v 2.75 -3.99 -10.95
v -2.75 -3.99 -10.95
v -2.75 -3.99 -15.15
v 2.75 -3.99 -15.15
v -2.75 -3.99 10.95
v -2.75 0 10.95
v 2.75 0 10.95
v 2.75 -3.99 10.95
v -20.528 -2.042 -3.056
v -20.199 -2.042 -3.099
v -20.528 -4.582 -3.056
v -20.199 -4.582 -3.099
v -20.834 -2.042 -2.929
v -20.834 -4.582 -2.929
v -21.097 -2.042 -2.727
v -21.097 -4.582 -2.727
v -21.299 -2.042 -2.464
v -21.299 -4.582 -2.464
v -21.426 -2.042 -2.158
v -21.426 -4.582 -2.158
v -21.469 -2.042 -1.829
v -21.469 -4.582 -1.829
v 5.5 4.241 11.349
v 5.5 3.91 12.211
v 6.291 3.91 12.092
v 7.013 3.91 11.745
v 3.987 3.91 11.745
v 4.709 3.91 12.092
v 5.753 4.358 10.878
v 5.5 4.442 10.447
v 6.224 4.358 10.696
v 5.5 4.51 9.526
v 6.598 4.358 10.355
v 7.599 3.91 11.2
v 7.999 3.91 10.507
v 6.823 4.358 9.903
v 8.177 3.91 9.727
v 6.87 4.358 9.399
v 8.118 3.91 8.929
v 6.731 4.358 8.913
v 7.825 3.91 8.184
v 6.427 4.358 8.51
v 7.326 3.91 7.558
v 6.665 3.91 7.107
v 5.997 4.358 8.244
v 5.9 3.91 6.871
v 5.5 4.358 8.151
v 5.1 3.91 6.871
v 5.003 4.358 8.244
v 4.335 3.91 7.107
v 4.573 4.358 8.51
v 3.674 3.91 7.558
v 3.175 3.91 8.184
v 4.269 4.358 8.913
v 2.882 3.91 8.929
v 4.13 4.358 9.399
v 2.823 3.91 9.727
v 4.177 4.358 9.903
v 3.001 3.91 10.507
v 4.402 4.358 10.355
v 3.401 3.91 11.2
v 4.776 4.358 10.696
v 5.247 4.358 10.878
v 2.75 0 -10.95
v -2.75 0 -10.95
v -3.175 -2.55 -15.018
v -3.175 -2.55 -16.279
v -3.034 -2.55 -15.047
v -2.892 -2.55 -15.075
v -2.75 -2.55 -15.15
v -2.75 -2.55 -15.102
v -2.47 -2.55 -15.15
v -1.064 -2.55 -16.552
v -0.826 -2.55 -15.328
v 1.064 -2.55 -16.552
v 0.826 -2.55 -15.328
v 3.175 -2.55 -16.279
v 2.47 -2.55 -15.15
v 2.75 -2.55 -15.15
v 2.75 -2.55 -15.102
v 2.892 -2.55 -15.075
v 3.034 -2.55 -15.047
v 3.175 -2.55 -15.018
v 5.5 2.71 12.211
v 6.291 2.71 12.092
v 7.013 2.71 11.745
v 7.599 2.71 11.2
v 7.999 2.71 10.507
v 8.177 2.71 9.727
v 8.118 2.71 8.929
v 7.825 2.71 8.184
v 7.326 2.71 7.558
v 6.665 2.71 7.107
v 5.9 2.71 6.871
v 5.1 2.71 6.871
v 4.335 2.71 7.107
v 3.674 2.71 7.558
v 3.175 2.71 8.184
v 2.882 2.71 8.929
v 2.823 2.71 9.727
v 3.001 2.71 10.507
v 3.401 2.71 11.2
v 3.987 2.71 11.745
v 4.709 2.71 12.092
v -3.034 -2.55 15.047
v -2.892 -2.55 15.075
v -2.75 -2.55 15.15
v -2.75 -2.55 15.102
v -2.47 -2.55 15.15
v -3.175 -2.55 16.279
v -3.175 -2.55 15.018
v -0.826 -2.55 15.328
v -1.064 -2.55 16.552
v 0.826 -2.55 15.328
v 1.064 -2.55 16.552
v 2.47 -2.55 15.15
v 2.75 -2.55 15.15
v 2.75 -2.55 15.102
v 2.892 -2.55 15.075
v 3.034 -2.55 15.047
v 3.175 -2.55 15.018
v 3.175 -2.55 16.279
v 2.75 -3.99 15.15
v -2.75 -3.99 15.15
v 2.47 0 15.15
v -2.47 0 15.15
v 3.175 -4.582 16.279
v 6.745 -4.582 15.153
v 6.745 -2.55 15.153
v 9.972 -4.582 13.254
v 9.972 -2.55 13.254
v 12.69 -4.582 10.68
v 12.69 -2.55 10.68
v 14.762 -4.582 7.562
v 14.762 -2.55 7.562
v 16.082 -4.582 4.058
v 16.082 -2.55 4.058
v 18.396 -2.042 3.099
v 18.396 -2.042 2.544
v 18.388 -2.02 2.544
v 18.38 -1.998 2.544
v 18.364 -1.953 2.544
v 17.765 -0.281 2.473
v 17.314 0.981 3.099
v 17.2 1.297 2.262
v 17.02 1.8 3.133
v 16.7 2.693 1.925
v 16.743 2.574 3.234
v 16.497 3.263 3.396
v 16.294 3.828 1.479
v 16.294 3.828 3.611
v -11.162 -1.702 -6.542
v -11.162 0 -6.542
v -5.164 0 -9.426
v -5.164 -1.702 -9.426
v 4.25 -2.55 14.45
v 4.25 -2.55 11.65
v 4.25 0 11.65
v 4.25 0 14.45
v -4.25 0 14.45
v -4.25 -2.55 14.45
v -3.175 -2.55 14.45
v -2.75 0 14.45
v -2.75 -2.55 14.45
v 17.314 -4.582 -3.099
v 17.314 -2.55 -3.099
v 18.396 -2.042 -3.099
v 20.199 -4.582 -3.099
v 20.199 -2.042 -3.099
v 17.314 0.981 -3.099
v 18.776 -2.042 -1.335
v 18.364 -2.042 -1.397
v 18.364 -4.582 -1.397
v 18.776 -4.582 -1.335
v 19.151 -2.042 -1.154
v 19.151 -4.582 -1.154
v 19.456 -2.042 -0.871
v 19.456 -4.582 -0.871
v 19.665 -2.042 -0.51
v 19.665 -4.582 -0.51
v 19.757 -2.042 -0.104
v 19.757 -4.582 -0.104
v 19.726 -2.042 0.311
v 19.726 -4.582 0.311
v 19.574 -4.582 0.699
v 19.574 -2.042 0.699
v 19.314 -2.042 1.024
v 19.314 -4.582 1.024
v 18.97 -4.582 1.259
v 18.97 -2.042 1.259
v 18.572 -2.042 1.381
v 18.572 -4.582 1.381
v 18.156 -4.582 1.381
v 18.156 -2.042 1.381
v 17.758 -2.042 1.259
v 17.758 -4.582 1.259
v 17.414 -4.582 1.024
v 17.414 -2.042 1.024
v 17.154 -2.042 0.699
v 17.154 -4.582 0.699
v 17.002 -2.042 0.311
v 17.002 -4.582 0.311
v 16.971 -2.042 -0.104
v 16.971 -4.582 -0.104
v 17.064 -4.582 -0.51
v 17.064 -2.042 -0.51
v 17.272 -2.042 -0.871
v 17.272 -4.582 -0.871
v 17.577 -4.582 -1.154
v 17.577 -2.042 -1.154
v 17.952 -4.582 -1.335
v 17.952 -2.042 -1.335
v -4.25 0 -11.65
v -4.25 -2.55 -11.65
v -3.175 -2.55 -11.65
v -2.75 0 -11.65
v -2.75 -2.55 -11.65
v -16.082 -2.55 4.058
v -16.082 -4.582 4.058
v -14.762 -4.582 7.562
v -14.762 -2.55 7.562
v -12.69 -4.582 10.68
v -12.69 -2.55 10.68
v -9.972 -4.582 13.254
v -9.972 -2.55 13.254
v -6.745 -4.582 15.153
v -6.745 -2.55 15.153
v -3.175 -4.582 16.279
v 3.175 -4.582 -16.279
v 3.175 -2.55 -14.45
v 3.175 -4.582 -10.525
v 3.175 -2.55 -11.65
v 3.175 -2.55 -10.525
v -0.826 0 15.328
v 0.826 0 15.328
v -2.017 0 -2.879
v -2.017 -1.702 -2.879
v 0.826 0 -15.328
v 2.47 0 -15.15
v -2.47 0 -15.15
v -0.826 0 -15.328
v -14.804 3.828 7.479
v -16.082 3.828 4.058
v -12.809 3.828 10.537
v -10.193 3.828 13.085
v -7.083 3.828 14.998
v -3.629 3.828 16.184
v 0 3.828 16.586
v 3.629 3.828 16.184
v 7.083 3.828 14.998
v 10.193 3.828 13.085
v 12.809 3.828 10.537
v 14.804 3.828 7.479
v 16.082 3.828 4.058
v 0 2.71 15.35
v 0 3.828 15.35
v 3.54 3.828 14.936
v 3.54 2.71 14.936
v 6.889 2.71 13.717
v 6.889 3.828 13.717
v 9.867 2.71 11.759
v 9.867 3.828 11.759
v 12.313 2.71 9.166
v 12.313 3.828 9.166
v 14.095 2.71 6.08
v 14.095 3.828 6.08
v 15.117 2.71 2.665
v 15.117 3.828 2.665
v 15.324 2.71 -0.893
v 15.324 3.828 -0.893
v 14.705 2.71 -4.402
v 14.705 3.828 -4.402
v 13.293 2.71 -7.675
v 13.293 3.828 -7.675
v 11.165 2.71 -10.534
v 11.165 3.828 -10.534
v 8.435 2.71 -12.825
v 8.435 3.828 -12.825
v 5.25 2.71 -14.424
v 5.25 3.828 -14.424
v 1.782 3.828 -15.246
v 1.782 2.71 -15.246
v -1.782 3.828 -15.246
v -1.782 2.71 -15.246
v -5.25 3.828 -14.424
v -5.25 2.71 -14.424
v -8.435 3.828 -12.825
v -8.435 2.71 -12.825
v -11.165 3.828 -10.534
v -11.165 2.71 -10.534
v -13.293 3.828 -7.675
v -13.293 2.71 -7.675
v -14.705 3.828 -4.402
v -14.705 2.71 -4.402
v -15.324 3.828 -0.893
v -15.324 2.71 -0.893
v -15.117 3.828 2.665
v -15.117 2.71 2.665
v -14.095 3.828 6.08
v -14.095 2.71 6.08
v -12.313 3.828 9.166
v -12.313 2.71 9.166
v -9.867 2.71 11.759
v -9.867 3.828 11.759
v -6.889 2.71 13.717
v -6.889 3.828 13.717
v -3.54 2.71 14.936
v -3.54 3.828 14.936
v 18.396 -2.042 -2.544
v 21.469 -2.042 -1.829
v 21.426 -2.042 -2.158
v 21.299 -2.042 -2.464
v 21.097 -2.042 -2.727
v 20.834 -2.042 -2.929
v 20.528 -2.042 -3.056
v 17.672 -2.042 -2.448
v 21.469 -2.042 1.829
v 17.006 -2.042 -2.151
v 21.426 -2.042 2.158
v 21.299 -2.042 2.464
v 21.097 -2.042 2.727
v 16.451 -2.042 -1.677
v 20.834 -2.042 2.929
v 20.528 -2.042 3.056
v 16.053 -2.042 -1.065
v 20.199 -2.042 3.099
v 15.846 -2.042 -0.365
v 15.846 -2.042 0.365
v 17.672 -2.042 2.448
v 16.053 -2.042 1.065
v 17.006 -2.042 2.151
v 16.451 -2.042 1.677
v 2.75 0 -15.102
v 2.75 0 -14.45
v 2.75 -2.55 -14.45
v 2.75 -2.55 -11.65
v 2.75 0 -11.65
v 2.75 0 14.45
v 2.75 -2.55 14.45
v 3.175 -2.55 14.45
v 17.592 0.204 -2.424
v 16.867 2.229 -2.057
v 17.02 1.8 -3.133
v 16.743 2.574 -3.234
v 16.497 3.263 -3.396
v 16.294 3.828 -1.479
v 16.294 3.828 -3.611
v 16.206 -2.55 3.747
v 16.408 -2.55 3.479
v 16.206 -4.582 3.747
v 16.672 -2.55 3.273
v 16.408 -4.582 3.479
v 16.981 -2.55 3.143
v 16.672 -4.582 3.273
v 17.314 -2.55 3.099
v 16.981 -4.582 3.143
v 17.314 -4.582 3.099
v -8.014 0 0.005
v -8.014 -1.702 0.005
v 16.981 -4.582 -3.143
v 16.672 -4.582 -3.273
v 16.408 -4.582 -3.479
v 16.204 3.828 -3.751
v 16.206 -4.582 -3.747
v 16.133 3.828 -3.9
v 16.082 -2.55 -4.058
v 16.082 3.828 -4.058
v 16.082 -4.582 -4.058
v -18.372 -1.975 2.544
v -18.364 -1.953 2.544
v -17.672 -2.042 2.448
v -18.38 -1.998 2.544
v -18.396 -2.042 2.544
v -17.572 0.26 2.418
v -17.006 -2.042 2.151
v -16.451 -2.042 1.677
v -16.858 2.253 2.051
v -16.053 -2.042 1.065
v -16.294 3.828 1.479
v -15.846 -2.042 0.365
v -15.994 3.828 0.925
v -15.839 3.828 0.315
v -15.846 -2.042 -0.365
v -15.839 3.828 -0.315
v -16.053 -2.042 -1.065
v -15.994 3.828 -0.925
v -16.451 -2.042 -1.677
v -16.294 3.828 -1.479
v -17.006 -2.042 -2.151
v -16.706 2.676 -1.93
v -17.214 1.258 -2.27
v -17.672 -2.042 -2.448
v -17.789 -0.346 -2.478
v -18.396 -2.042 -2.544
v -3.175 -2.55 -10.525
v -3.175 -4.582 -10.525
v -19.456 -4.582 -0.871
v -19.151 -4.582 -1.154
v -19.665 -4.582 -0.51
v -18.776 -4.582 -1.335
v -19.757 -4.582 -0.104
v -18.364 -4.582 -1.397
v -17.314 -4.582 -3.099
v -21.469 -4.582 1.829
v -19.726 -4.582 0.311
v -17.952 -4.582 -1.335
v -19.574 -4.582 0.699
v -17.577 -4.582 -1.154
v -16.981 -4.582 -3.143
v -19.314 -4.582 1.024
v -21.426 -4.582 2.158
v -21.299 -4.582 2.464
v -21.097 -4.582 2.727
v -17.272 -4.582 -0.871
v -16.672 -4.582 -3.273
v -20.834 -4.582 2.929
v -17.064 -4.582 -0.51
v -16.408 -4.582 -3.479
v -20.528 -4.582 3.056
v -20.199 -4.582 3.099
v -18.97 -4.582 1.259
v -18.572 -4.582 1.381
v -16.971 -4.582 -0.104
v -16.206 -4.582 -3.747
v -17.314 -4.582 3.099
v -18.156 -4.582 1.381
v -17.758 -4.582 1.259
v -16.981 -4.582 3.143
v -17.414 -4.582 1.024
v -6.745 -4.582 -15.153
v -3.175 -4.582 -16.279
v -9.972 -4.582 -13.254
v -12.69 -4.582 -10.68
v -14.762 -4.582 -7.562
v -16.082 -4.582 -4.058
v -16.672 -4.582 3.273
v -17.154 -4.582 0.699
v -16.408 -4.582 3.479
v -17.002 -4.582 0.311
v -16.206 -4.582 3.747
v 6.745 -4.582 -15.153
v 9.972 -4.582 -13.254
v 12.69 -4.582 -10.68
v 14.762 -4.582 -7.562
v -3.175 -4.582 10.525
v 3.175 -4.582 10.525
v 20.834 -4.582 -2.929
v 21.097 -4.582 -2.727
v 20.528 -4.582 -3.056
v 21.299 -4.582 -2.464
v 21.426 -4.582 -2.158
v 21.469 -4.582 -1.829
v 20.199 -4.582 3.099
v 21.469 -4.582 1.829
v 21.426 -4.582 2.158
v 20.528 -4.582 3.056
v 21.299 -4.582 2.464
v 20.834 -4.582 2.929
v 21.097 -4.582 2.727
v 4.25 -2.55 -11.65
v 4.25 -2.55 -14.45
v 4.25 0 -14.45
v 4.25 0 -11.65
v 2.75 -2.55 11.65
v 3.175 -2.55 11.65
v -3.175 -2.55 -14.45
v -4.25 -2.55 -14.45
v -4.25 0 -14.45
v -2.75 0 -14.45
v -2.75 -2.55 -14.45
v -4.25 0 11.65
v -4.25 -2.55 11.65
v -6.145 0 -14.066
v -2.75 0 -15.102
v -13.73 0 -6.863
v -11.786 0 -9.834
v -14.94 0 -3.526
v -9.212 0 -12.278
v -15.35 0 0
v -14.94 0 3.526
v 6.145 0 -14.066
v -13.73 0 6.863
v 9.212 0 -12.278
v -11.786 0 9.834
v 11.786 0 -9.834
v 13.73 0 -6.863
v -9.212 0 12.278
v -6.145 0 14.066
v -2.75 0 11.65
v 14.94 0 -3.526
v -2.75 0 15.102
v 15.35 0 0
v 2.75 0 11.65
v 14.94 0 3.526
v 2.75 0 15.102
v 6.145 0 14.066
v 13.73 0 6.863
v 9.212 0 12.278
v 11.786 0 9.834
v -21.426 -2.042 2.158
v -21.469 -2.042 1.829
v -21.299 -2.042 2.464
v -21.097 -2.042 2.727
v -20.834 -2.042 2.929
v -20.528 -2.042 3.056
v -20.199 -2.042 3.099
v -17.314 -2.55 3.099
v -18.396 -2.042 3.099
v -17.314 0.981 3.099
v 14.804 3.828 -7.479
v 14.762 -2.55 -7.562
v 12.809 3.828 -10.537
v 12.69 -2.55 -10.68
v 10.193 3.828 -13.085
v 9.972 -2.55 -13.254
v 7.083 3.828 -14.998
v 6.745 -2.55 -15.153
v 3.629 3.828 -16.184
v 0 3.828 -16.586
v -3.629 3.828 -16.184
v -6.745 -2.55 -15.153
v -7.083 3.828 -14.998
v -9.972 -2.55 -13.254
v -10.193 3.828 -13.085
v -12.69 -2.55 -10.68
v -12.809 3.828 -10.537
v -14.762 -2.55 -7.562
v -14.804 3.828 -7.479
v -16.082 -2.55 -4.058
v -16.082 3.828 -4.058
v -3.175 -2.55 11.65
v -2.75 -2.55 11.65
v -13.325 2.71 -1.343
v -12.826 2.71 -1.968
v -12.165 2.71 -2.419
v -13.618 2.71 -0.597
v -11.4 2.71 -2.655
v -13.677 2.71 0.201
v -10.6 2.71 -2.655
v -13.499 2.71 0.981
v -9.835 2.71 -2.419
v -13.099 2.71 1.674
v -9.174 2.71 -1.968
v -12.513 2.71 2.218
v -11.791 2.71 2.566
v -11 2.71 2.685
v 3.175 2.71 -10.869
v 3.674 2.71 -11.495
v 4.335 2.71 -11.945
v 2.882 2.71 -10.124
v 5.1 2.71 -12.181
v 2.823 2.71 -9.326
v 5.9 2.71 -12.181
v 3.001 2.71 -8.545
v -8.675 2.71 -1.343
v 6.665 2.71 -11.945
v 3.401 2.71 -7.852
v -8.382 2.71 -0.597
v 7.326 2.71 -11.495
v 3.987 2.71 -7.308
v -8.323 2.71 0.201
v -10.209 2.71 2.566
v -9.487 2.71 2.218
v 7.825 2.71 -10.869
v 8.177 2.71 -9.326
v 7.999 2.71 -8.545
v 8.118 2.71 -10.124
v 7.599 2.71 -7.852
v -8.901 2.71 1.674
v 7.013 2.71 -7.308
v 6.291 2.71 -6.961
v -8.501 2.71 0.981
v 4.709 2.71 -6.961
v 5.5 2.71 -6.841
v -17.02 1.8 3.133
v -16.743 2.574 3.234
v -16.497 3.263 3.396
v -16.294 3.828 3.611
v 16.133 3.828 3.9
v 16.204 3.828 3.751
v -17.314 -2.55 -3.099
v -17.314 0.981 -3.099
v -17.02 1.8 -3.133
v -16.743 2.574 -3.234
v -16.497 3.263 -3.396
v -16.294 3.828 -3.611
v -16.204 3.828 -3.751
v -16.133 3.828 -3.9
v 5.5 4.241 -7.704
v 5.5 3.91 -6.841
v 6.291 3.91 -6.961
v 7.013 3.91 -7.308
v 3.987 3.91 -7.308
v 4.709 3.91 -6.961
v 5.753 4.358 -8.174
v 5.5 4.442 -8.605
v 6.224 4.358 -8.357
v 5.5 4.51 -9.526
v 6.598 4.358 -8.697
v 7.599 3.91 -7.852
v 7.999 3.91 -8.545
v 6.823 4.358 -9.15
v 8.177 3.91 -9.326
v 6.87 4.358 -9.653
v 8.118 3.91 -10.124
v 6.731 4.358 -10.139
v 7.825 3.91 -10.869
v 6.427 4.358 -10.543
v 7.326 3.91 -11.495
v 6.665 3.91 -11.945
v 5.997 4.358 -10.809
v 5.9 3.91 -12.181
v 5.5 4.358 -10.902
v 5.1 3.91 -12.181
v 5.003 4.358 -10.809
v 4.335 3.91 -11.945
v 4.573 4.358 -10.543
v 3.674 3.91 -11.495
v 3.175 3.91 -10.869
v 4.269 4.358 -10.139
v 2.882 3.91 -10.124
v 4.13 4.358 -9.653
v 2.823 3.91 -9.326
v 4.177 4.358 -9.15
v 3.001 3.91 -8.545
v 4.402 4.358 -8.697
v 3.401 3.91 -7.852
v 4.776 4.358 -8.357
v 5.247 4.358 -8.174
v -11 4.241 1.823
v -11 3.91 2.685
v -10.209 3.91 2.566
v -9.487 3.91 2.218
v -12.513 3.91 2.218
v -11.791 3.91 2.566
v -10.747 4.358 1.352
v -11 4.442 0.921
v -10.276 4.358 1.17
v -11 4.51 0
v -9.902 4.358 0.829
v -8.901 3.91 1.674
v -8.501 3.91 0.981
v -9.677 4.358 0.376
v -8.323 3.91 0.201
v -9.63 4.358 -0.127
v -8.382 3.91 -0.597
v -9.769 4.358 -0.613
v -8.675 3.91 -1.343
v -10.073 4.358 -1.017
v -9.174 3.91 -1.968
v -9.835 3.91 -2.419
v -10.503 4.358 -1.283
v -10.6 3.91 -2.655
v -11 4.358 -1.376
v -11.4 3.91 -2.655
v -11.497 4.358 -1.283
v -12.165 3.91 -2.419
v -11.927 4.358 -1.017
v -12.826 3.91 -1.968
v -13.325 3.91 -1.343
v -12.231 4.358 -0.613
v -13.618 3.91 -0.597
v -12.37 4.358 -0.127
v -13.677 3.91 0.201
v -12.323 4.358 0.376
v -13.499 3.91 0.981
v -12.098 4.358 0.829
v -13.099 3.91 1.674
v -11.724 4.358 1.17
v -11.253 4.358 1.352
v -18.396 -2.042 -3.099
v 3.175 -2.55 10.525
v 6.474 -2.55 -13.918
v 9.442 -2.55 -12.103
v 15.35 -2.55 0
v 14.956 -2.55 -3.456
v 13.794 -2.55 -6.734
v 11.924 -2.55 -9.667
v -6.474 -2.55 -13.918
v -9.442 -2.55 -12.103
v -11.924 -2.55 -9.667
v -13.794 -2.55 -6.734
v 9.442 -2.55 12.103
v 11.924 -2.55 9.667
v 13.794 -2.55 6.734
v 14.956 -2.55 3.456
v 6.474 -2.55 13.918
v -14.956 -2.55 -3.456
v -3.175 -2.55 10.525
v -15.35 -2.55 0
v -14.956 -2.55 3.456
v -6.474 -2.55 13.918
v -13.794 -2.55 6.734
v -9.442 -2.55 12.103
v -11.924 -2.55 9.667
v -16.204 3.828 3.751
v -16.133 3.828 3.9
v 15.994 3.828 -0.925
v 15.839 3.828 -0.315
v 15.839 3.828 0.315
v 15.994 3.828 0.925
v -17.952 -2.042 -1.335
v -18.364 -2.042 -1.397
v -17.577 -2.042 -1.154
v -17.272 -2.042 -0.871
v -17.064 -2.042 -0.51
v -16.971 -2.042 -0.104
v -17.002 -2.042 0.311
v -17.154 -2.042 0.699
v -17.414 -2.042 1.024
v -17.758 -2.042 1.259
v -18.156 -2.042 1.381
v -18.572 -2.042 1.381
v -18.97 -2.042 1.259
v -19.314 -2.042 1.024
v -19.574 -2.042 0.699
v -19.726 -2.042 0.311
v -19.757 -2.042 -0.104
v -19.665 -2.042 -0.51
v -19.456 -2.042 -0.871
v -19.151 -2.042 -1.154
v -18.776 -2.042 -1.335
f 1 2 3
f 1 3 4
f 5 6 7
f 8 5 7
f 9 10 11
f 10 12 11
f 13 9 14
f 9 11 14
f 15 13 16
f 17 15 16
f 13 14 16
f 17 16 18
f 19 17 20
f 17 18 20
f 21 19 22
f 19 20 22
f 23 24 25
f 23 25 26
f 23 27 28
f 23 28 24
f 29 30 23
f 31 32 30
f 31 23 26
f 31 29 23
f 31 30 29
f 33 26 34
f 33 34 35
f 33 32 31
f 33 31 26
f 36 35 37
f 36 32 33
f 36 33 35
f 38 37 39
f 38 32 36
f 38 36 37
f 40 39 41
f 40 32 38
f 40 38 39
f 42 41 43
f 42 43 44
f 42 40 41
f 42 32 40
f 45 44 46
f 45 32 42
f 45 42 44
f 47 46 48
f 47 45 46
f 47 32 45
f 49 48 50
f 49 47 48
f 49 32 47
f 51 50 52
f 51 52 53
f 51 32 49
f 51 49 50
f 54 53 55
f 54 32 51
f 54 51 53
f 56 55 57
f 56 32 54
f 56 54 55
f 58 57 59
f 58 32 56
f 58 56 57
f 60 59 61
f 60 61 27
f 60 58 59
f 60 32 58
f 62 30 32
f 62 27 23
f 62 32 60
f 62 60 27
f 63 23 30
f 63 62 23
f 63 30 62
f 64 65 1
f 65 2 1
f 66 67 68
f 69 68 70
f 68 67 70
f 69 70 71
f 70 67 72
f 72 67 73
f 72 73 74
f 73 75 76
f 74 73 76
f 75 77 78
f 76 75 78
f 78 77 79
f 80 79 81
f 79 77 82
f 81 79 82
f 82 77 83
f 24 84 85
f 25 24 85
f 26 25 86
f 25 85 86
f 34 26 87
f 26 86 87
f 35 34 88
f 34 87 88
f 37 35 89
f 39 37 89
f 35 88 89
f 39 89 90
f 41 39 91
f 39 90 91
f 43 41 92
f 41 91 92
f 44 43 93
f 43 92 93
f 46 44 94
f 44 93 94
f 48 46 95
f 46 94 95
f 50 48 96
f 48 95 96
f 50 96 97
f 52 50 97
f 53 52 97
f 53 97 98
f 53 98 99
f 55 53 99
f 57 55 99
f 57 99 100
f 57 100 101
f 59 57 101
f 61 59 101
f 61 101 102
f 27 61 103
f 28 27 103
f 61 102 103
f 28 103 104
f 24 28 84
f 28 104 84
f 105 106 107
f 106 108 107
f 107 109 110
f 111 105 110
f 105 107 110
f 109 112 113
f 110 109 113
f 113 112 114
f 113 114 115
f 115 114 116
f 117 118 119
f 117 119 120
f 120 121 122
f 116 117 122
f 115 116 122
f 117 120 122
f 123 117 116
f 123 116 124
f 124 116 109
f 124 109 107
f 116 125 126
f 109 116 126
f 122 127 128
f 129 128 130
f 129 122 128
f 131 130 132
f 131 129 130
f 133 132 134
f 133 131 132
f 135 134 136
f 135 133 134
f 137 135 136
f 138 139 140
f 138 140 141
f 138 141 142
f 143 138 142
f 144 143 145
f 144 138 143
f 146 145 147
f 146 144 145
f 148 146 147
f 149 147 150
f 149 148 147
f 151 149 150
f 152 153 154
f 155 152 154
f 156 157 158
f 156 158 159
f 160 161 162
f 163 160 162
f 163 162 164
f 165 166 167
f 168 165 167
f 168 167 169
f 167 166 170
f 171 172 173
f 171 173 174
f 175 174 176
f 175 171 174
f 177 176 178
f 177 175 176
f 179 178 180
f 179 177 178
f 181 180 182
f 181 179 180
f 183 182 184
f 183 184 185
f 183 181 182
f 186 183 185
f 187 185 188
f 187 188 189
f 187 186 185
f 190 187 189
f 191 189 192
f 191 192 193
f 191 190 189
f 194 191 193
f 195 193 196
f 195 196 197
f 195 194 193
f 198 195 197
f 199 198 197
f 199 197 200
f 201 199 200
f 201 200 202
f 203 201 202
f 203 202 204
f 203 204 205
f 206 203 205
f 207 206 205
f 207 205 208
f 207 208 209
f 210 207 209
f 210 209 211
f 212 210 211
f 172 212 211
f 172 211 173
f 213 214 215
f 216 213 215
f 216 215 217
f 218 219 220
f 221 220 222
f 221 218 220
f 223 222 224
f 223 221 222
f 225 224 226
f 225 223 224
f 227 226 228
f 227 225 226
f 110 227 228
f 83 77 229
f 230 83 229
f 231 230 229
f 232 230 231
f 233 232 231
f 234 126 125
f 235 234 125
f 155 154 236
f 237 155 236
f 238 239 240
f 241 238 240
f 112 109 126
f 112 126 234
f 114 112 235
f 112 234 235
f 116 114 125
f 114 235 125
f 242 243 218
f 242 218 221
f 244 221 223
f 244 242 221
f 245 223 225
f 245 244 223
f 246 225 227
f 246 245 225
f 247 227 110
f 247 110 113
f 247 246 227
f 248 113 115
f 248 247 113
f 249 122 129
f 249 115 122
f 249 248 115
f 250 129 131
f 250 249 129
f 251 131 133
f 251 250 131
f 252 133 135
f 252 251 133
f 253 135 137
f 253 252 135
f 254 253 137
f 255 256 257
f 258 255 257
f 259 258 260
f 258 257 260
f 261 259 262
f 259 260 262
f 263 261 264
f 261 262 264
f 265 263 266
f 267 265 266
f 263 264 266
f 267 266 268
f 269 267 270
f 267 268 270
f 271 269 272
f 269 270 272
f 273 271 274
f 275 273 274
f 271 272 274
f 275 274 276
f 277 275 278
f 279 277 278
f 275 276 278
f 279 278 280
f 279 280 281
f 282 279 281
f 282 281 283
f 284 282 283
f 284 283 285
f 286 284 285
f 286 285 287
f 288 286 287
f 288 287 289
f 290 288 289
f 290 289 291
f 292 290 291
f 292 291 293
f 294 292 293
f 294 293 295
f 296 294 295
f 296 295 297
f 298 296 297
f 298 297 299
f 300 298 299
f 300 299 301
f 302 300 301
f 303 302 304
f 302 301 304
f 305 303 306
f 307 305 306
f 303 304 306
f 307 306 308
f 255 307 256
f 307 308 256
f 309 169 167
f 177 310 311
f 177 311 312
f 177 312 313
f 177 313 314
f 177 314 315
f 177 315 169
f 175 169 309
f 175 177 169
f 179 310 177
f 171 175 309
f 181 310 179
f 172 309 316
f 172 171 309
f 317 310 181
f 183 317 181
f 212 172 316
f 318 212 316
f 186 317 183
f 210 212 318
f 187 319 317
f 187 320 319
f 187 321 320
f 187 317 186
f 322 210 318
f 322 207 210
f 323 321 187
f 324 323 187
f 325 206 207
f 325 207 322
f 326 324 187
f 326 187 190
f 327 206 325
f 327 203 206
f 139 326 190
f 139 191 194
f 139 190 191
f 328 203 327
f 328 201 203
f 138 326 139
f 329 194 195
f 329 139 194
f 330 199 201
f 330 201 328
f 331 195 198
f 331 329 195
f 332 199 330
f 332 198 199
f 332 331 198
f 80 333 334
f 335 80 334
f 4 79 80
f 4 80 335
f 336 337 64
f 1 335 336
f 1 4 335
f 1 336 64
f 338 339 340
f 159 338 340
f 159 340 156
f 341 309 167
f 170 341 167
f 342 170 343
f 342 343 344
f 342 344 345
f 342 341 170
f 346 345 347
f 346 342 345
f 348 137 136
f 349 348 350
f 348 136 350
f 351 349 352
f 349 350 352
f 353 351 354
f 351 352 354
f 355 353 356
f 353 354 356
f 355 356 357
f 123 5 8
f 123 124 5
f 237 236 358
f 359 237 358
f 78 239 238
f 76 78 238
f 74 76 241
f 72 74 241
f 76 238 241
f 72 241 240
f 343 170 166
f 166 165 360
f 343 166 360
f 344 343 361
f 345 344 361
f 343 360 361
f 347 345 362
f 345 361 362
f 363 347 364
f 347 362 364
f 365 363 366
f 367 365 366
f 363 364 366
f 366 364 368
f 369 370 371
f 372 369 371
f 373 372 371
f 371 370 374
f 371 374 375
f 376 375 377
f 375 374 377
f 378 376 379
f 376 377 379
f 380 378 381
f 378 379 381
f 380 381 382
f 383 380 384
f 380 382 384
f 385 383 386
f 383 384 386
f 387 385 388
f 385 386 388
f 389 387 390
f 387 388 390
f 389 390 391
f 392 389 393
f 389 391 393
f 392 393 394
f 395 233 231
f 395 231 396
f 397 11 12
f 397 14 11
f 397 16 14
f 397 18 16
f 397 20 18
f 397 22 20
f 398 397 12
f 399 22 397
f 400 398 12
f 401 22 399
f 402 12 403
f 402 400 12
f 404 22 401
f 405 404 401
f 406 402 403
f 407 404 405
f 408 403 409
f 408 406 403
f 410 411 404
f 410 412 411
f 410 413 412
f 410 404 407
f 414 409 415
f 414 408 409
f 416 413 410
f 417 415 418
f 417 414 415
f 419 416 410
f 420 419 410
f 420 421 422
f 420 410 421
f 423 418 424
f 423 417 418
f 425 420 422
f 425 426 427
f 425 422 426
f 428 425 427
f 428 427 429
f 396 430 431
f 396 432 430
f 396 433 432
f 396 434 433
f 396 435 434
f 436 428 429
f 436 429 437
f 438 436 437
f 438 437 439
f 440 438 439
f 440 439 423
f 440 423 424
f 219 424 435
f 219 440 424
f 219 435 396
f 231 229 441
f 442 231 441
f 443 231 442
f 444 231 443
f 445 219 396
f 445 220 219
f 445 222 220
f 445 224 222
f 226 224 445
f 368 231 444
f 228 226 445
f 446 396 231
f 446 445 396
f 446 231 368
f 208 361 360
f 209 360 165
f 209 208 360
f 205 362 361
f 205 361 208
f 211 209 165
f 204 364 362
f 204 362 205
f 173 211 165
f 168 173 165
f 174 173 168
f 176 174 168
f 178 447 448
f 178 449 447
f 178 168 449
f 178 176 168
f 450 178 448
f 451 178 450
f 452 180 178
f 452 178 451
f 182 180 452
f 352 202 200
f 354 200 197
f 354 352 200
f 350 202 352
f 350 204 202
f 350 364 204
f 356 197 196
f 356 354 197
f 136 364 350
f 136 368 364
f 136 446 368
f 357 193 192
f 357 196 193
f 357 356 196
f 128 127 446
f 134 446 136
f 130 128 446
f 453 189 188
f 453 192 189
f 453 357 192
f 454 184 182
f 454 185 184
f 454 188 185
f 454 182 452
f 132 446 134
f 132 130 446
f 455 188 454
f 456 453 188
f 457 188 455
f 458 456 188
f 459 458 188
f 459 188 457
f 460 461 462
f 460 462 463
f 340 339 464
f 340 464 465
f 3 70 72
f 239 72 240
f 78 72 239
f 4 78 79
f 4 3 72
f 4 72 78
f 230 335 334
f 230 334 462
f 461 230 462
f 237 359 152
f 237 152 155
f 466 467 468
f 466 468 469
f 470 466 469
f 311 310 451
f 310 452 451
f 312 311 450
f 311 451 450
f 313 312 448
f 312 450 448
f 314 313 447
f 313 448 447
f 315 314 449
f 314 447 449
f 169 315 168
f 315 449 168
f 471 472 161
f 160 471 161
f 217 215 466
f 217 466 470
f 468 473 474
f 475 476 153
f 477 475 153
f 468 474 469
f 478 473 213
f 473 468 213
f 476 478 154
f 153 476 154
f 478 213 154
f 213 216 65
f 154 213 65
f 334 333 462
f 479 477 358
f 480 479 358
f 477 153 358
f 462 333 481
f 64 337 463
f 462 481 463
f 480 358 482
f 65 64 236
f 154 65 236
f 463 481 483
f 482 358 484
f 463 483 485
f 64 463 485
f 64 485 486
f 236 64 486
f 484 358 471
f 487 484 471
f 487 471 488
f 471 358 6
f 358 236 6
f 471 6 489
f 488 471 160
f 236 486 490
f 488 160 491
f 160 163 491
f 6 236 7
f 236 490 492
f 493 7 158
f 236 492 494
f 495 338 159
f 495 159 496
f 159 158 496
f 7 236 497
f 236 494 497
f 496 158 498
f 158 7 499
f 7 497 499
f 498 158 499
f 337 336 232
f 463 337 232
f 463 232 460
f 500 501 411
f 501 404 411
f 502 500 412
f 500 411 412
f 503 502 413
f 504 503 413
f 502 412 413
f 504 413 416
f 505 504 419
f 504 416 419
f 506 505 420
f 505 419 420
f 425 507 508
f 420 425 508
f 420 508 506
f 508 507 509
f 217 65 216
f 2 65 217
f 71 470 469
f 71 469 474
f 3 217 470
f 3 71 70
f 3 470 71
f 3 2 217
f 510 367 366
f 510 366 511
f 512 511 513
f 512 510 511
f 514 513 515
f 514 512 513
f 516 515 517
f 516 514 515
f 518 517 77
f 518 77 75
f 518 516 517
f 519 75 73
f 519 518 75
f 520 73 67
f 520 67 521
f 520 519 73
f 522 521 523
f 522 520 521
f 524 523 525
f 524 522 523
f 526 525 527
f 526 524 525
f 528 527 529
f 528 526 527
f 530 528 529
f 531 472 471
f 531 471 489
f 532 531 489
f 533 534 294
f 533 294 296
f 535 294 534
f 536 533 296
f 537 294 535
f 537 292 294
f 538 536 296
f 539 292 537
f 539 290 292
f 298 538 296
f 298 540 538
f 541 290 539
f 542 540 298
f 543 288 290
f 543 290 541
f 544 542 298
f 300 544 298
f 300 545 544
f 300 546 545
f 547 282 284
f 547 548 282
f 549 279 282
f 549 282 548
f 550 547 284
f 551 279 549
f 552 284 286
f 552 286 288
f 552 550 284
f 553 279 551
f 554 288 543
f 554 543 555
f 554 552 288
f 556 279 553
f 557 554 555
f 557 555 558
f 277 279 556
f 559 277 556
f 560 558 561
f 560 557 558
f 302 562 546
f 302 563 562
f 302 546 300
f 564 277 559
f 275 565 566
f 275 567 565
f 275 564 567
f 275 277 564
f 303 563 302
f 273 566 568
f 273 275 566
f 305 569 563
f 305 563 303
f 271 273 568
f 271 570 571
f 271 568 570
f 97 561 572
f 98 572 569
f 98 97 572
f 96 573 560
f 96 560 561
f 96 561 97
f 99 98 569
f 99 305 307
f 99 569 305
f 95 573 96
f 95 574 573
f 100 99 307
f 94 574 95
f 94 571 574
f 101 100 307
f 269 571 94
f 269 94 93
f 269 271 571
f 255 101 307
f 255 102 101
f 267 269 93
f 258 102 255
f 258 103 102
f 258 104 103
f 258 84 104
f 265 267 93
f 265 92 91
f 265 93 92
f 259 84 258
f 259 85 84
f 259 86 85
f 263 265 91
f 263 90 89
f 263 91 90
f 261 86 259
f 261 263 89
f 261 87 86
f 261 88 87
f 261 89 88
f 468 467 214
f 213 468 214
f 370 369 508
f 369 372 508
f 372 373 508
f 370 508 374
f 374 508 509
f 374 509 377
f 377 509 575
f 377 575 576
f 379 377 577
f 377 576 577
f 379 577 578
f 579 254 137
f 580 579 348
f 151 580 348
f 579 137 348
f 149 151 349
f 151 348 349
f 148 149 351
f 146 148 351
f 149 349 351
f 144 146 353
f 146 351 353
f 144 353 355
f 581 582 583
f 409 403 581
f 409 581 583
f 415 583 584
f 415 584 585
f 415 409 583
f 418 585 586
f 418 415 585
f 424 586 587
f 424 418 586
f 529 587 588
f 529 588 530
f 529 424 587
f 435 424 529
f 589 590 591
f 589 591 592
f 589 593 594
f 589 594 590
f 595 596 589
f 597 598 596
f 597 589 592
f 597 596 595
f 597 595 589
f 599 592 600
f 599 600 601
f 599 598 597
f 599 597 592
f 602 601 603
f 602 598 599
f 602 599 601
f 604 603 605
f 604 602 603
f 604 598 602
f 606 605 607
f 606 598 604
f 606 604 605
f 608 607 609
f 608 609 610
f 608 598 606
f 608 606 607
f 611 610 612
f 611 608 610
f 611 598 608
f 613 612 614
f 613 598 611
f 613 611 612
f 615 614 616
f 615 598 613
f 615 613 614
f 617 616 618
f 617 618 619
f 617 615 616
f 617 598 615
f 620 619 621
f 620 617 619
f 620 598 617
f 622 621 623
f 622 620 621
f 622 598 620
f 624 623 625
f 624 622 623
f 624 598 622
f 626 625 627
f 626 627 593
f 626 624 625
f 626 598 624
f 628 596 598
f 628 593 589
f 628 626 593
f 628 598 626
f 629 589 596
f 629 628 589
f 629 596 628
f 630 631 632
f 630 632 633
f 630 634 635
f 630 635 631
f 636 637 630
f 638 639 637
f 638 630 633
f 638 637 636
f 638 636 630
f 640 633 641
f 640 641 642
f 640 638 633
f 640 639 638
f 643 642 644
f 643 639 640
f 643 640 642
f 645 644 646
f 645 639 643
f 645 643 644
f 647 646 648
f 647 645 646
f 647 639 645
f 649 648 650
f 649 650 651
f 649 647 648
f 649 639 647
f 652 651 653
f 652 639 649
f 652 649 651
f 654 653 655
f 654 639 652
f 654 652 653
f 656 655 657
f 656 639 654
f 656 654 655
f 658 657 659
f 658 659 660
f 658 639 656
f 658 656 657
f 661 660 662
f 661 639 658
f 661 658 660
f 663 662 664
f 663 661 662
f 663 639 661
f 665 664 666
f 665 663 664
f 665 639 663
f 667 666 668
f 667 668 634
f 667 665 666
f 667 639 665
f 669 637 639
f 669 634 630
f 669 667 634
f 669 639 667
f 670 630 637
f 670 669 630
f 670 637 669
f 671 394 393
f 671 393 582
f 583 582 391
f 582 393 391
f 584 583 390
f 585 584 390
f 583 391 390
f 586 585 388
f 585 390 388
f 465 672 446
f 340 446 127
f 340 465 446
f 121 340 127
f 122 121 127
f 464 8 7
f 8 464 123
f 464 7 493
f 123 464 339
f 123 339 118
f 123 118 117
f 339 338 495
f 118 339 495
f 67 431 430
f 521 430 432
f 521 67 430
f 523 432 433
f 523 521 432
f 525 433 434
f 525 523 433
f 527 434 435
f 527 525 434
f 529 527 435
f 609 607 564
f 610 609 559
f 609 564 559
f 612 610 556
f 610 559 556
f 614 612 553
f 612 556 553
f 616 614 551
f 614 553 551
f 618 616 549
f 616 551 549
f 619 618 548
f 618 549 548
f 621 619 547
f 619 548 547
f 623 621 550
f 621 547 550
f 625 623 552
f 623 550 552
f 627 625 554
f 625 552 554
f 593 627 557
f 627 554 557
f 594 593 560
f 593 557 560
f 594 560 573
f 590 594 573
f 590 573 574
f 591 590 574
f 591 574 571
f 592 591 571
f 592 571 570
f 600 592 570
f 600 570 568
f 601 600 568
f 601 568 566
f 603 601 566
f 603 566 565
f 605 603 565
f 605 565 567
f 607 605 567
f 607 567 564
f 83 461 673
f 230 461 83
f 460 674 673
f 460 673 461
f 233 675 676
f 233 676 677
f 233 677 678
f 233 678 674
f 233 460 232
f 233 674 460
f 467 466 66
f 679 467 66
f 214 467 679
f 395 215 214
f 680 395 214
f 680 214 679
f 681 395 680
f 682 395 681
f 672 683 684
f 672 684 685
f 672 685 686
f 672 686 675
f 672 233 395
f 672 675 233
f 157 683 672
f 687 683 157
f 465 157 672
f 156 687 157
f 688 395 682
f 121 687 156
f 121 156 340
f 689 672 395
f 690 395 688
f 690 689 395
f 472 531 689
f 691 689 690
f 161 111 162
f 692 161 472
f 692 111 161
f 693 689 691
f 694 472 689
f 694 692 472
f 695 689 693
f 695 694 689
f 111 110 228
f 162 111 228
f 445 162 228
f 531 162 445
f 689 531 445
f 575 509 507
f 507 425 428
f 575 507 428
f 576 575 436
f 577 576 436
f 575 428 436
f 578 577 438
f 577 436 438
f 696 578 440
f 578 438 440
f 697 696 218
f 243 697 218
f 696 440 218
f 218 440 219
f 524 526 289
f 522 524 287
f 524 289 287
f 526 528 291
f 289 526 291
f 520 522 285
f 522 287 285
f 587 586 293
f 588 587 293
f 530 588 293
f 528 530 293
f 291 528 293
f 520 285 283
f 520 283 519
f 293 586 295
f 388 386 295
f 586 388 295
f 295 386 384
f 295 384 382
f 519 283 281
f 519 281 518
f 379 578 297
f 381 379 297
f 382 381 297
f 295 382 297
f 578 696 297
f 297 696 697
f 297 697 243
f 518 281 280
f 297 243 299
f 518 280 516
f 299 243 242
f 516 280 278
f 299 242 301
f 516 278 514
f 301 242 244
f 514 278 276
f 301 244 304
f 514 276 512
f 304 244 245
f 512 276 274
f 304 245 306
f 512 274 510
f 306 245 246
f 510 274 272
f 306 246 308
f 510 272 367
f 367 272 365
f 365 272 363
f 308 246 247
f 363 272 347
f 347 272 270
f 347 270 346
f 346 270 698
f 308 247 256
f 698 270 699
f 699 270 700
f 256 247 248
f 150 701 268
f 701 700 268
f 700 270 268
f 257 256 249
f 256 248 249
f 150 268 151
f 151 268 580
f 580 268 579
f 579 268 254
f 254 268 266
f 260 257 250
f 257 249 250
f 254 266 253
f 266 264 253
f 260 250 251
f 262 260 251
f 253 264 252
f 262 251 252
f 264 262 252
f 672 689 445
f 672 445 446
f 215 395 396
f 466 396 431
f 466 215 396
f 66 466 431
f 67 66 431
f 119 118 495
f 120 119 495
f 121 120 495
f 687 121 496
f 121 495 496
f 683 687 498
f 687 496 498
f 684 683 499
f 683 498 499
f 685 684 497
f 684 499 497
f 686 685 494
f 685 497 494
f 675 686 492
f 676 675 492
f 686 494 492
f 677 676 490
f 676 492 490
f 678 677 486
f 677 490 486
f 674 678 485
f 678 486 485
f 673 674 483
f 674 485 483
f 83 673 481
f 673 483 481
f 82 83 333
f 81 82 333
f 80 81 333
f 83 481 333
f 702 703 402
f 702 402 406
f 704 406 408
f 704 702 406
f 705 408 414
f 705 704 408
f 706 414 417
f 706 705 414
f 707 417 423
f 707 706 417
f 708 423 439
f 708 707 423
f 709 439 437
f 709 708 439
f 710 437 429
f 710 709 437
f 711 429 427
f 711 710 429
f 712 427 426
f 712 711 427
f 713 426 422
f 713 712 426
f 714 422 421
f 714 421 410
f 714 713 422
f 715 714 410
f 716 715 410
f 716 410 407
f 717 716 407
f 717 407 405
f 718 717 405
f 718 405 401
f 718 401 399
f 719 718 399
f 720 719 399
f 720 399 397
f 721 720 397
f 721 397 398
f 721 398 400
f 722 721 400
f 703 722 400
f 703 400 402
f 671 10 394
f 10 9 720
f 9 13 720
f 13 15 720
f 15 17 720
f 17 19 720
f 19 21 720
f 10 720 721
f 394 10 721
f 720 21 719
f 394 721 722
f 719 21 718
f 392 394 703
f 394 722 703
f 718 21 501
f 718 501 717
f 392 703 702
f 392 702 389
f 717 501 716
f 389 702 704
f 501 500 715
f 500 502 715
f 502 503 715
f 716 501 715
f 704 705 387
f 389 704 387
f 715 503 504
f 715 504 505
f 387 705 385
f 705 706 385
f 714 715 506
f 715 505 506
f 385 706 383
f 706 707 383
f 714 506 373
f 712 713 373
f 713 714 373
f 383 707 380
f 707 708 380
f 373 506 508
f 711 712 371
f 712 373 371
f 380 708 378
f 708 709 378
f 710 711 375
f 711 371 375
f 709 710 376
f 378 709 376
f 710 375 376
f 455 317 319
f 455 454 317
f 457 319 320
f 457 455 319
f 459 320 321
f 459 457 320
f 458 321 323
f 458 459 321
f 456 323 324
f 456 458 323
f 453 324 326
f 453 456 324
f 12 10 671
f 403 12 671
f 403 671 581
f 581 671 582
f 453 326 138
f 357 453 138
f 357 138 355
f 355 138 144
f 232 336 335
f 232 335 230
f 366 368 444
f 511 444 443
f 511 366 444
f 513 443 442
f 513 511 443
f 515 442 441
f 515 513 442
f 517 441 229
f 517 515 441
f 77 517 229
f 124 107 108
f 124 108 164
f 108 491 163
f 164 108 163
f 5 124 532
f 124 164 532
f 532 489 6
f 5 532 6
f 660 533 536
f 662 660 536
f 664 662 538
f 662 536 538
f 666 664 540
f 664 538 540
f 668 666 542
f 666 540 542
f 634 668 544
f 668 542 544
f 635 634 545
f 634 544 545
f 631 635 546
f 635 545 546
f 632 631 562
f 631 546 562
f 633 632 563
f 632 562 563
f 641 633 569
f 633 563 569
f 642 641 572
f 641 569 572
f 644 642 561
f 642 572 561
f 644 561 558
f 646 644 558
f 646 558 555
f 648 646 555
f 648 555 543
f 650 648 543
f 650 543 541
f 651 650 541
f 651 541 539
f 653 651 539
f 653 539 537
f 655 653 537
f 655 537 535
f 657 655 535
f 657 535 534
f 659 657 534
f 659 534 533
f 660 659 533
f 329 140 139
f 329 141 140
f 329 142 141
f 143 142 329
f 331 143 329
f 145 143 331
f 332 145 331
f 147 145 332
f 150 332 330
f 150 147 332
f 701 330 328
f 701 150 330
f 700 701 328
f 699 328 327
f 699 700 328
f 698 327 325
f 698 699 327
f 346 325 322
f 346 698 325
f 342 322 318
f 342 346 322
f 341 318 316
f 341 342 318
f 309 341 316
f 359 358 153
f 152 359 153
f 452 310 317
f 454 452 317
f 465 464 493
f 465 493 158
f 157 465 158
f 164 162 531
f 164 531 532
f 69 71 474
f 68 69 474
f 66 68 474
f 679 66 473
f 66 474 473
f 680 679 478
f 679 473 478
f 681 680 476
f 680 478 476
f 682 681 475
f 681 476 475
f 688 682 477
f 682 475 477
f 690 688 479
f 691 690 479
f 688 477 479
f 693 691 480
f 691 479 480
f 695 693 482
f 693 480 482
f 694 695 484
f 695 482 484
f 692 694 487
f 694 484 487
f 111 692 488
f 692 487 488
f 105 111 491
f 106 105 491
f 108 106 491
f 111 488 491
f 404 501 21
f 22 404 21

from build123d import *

# Parameters (mm, degrees)
SKETCH1_R                      = 15.35
BOSS_EXTRUDE1_DEPTH            = 2.71
SKETCH2_R                      = 2.685
BOSS_EXTRUDE2_DEPTH            = 1.2
DOME1_FACE_RADIUS              = 2.685
DOME1_HEIGHT                   = 0.6
CIRPATTERN1_COUNT              = 3
CIRPATTERN1_COPY_1_FACE_RADIUS = 2.685
CIRPATTERN1_COPY_1_HEIGHT      = 0.6
CIRPATTERN1_COPY_2_FACE_RADIUS = 2.685
CIRPATTERN1_COPY_2_HEIGHT      = 0.6
BOSS_EXTRUDE3_START            = 2.55
SKETCH3_W                      = 5.5
SKETCH3_H                      = 4.2
SKETCH3_W_2                    = 1.5
SKETCH3_H_2                    = 2.8
BOSS_EXTRUDE3_DEPTH            = 2.55
SKETCH4_W                      = 5.5
SKETCH4_H                      = 4.2
BOSS_EXTRUDE4_DEPTH            = 1.44
CHIP_DEPTH                     = 1.7018
BOSS_EXTRUDE5_DEPTH            = 2.032
BOSS_EXTRUDE6_START            = 6.37794
SKETCH7_R                      = 16.5862
SKETCH7_R_2                    = 15.35
BOSS_EXTRUDE6_DEPTH            = 6.37794
BOSS_EXTRUDE7_START            = -8.40994
SKETCH8_R                      = 1.397
BOSS_EXTRUDE7_DEPTH            = 8.40994
SKETCH9_R                      = 2.5443
CUT_EXTRUDE1_DEPTH             = 5.86994
CUT_EXTRUDE4_REACH             = 31.486
FILLET1_R                      = 1.27


with BuildPart() as part:
    # Sketch1 → Boss-Extrude1 (new body)
    with BuildSketch(Plane(origin=(0, 0, 0), x_dir=(1, 0, 0), z_dir=(0, 1, 0))):
        with Locations(Location((0, 0, 0), (0, 0, 270))):
            Circle(SKETCH1_R)
    extrude(amount=BOSS_EXTRUDE1_DEPTH)

    # Sketch2 → Boss-Extrude2 (add)
    with BuildSketch(Plane(origin=(0, 2.71, 0), x_dir=(-1, 0, 0), z_dir=(0, 1, 0))):
        with Locations(Location((-5.5, 9.526279442, 0), (0, 0, 90))):
            Circle(SKETCH2_R)
    boss_extrude2 = extrude(amount=BOSS_EXTRUDE2_DEPTH)

    # Dome1: a dome of height H over a round flat face of radius A is a cap of a sphere of radius (A * A + H * H) / (2 * H)
    dome1_r = (DOME1_FACE_RADIUS * DOME1_FACE_RADIUS + DOME1_HEIGHT * DOME1_HEIGHT) / (2 * DOME1_HEIGHT)
    dome1_base = Plane((5.5, 3.91, 9.526279442), z_dir=(0, 1, 0))
    with Locations(dome1_base.offset(DOME1_HEIGHT - dome1_r)):
        dome1_ball = Sphere(dome1_r, mode=Mode.PRIVATE)
    add(split(dome1_ball, bisect_by=dome1_base, keep=Keep.TOP, mode=Mode.PRIVATE))

    # CirPattern1: Boss-Extrude2 ×3 about axis
    cirpattern1_axis = Axis((0, 0, 0), (0, 1, 0))
    for i in range(1, CIRPATTERN1_COUNT):
        add(boss_extrude2.rotate(cirpattern1_axis, i * 360 / CIRPATTERN1_COUNT))

    # CirPattern1 copy 1: a dome of height H over a round flat face of radius A is a cap of a sphere of radius (A * A + H * H) / (2 * H)
    cirpattern1_copy_1_r = (CIRPATTERN1_COPY_1_FACE_RADIUS * CIRPATTERN1_COPY_1_FACE_RADIUS + CIRPATTERN1_COPY_1_HEIGHT * CIRPATTERN1_COPY_1_HEIGHT) / (2 * CIRPATTERN1_COPY_1_HEIGHT)
    cirpattern1_copy_1_base = Plane((5.5, 3.91, -9.526279442), z_dir=(0, 1, 0))
    with Locations(cirpattern1_copy_1_base.offset(CIRPATTERN1_COPY_1_HEIGHT - cirpattern1_copy_1_r)):
        cirpattern1_copy_1_ball = Sphere(cirpattern1_copy_1_r, mode=Mode.PRIVATE)
    add(split(cirpattern1_copy_1_ball, bisect_by=cirpattern1_copy_1_base, keep=Keep.TOP, mode=Mode.PRIVATE))

    # CirPattern1 copy 2: a dome of height H over a round flat face of radius A is a cap of a sphere of radius (A * A + H * H) / (2 * H)
    cirpattern1_copy_2_r = (CIRPATTERN1_COPY_2_FACE_RADIUS * CIRPATTERN1_COPY_2_FACE_RADIUS + CIRPATTERN1_COPY_2_HEIGHT * CIRPATTERN1_COPY_2_HEIGHT) / (2 * CIRPATTERN1_COPY_2_HEIGHT)
    cirpattern1_copy_2_base = Plane((-11, 3.91, 0), z_dir=(0, 1, 0))
    with Locations(cirpattern1_copy_2_base.offset(CIRPATTERN1_COPY_2_HEIGHT - cirpattern1_copy_2_r)):
        cirpattern1_copy_2_ball = Sphere(cirpattern1_copy_2_r, mode=Mode.PRIVATE)
    add(split(cirpattern1_copy_2_ball, bisect_by=cirpattern1_copy_2_base, keep=Keep.TOP, mode=Mode.PRIVATE))

    # Sketch3 → Boss-Extrude3 (add)
    with BuildSketch(Plane.XZ.offset(BOSS_EXTRUDE3_START)):
        with Locations((0, 13.05)):
            Rectangle(SKETCH3_W, SKETCH3_H)
        with Locations((0, -13.05)):
            Rectangle(SKETCH3_W, SKETCH3_H)
        with Locations((3.5, 13.05)):
            Rectangle(SKETCH3_W_2, SKETCH3_H_2)
        with Locations((-3.5, 13.05)):
            Rectangle(SKETCH3_W_2, SKETCH3_H_2)
        with Locations((3.5, -13.05)):
            Rectangle(SKETCH3_W_2, SKETCH3_H_2)
        with Locations((-3.5, -13.05)):
            Rectangle(SKETCH3_W_2, SKETCH3_H_2)
        with BuildLine():
            Line((2.75, 15.101655538), (2.75, 15.15))
            Line((2.75, 15.15), (2.469817807, 15.15))
            ThreePointArc((2.469817807, 15.15), (2.610020839, 15.126476497), (2.75, 15.101655538))
        make_face()
        with BuildLine():
            ThreePointArc((-2.75, 15.101655538), (-2.610020839, 15.126476497), (-2.469817807, 15.15))
            Line((-2.469817807, 15.15), (-2.75, 15.15))
            Line((-2.75, 15.15), (-2.75, 15.101655538))
        make_face()
        with BuildLine():
            ThreePointArc((-2.469817807, -15.15), (-2.610020839, -15.126476497), (-2.75, -15.101655538))
            Line((-2.75, -15.101655538), (-2.75, -15.15))
            Line((-2.75, -15.15), (-2.469817807, -15.15))
        make_face()
        with BuildLine():
            Line((2.75, -15.15), (2.75, -15.101655538))
            ThreePointArc((2.75, -15.101655538), (2.610020839, -15.126476497), (2.469817807, -15.15))
            Line((2.469817807, -15.15), (2.75, -15.15))
        make_face()
    extrude(amount=-BOSS_EXTRUDE3_DEPTH)

    # Sketch4 → Boss-Extrude4 (add)
    with BuildSketch(Plane.XZ.offset(2.55)):
        Polygon((-2.75, 10.95), (2.75, 10.95), (2.75, 11.65), (2.75, 14.45), (2.75, 15.15), (-2.75, 15.15), (-2.75, 14.45), (-2.75, 11.65), align=None)
        with Locations((0, -13.05)):
            Rectangle(SKETCH4_W, SKETCH4_H)
    extrude(amount=BOSS_EXTRUDE4_DEPTH)

    # Sketch5 → Chip (add)
    with BuildSketch(Plane.XZ):
        Polygon((-5.1644, -9.425953844), (-2.016601499, -2.878979584), (-8.014179317, 0.004667994), (-11.161977818, -6.542306266), align=None)
    extrude(amount=CHIP_DEPTH)

    # Sketch6 → Boss-Extrude5 (add)
    with BuildSketch(Plane.XZ.offset(2.55)):
        with BuildLine():
            Line((-3.175, 16.279478046), (-3.175, 10.525))
            Line((-3.175, 10.525), (3.175, 10.525))
            Line((3.175, 10.525), (3.175, 16.279478046))
            ThreePointArc((3.175, 16.279478046), (16.5862, 0), (3.175, -16.279478046))
            Line((3.175, -16.279478046), (3.175, -10.525))
            Line((3.175, -10.525), (-3.175, -10.525))
            Line((-3.175, -10.525), (-3.175, -16.279478046))
            ThreePointArc((-3.175, -16.279478046), (-16.5862, 0), (-3.175, 16.279478046))
        make_face()
    extrude(amount=BOSS_EXTRUDE5_DEPTH)

    # Sketch7 → Boss-Extrude6 (add)
    with BuildSketch(Plane(origin=(0, -2.55, 0), x_dir=(1, 0, 0), z_dir=(0, 1, 0)).offset(BOSS_EXTRUDE6_START)):
        with Locations(Location((0, 0, 0), (0, 0, 270))):
            Circle(SKETCH7_R)
        with Locations(Location((0, 0, 0), (0, 0, 270))):
            Circle(SKETCH7_R_2, mode=Mode.SUBTRACT)
    extrude(amount=-BOSS_EXTRUDE6_DEPTH)

    # Sketch8 → Boss-Extrude7 (add)
    # profile 1 of 2: a face of its own
    with BuildSketch(Plane.XZ.offset(4.582).offset(BOSS_EXTRUDE7_START)):
        with BuildLine():
            ThreePointArc((-16.294154443, -3.0988), (-16.5862, 0), (-16.294154443, 3.0988))
            Line((-16.294154443, 3.0988), (-21.46935, 3.0988))
            Line((-21.46935, 3.0988), (-21.46935, -3.0988))
            Line((-21.46935, -3.0988), (-16.294154443, -3.0988))
        make_face()
        with Locations(Location((-18.3642, 0, 0), (0, 0, 270))):
            Circle(SKETCH8_R, mode=Mode.SUBTRACT)
    # profile 2 of 2: a face of its own
    with BuildSketch(Plane.XZ.offset(4.582).offset(BOSS_EXTRUDE7_START)):
        with BuildLine():
            Line((21.46935, 3.0988), (16.294154443, 3.0988))
            ThreePointArc((16.294154443, 3.0988), (16.5862, 0), (16.294154443, -3.0988))
            Line((16.294154443, -3.0988), (21.46935, -3.0988))
            Line((21.46935, -3.0988), (21.46935, 3.0988))
        make_face()
        with Locations(Location((18.3642, 0, 0), (0, 0, 270))):
            Circle(SKETCH8_R, mode=Mode.SUBTRACT)
    extrude(amount=BOSS_EXTRUDE7_DEPTH)

    # Sketch9 → Cut-Extrude1 (cut)
    with BuildSketch(Plane(origin=(0, 3.82794, 0), x_dir=(1, 0, 0), z_dir=(0, 1, 0))):
        with Locations(Location((-18.3642, 0, 0), (0, 0, 270))):
            Circle(SKETCH9_R)
    cut_extrude1 = extrude(amount=-CUT_EXTRUDE1_DEPTH, mode=Mode.SUBTRACT)

    # Cut-Extrude4: up to this face of the body (flat: up to its plane)
    cut_extrude4_end = Plane(part.part.faces().sort_by_distance((-18.881752221, -0.37703, -3.0988))[0])
    # Sketch10 → Cut-Extrude4 (cut, up to the picked face)
    with BuildSketch(Plane.XY.offset(3.0988), mode=Mode.PRIVATE) as cut_extrude4_sk1:
        Polygon((-21.46935, -2.042), (-18.39595, -2.042), (-16.294154443, 3.82794), (-21.46935, 3.82794), align=None)
    cut_extrude4_tool1 = split(extrude(cut_extrude4_sk1.sketch, amount=-CUT_EXTRUDE4_REACH, mode=Mode.PRIVATE), bisect_by=cut_extrude4_end, keep=Keep.BOTH, mode=Mode.PRIVATE)
    cut_extrude4 = cut_extrude4_tool1.solids().sort_by(Axis((-19.362572, 1.142253, 3.0988), (0, 0, -1)))[0]
    add(cut_extrude4, mode=Mode.SUBTRACT)

    # Mirror2: Cut-Extrude1, Cut-Extrude4 across plane
    add(cut_extrude1.mirror(Plane(origin=(0, 0, 0), x_dir=(0, 0, 1), z_dir=(1, 0, 0))), mode=Mode.SUBTRACT)
    add(cut_extrude4.mirror(Plane(origin=(0, 0, 0), x_dir=(0, 0, 1), z_dir=(1, 0, 0))), mode=Mode.SUBTRACT)

    # Fillet1
    fillet1_edges = [part.edges().sort_by_distance(p)[0] for p in [
        (16.294154443, -0.37703, -3.0988),
        (16.294154443, -0.37703, 3.0988),
        (-16.294154443, 0.63897, -3.0988),
        (-16.294154443, 0.63897, 3.0988),
        (-21.46935, -3.312, 3.0988),
        (-21.46935, -3.312, -3.0988),
        (21.46935, -3.312, 3.0988),
        (21.46935, -3.312, -3.0988),
    ]]
    fillet(fillet1_edges, radius=FILLET1_R)


solid = part.part
